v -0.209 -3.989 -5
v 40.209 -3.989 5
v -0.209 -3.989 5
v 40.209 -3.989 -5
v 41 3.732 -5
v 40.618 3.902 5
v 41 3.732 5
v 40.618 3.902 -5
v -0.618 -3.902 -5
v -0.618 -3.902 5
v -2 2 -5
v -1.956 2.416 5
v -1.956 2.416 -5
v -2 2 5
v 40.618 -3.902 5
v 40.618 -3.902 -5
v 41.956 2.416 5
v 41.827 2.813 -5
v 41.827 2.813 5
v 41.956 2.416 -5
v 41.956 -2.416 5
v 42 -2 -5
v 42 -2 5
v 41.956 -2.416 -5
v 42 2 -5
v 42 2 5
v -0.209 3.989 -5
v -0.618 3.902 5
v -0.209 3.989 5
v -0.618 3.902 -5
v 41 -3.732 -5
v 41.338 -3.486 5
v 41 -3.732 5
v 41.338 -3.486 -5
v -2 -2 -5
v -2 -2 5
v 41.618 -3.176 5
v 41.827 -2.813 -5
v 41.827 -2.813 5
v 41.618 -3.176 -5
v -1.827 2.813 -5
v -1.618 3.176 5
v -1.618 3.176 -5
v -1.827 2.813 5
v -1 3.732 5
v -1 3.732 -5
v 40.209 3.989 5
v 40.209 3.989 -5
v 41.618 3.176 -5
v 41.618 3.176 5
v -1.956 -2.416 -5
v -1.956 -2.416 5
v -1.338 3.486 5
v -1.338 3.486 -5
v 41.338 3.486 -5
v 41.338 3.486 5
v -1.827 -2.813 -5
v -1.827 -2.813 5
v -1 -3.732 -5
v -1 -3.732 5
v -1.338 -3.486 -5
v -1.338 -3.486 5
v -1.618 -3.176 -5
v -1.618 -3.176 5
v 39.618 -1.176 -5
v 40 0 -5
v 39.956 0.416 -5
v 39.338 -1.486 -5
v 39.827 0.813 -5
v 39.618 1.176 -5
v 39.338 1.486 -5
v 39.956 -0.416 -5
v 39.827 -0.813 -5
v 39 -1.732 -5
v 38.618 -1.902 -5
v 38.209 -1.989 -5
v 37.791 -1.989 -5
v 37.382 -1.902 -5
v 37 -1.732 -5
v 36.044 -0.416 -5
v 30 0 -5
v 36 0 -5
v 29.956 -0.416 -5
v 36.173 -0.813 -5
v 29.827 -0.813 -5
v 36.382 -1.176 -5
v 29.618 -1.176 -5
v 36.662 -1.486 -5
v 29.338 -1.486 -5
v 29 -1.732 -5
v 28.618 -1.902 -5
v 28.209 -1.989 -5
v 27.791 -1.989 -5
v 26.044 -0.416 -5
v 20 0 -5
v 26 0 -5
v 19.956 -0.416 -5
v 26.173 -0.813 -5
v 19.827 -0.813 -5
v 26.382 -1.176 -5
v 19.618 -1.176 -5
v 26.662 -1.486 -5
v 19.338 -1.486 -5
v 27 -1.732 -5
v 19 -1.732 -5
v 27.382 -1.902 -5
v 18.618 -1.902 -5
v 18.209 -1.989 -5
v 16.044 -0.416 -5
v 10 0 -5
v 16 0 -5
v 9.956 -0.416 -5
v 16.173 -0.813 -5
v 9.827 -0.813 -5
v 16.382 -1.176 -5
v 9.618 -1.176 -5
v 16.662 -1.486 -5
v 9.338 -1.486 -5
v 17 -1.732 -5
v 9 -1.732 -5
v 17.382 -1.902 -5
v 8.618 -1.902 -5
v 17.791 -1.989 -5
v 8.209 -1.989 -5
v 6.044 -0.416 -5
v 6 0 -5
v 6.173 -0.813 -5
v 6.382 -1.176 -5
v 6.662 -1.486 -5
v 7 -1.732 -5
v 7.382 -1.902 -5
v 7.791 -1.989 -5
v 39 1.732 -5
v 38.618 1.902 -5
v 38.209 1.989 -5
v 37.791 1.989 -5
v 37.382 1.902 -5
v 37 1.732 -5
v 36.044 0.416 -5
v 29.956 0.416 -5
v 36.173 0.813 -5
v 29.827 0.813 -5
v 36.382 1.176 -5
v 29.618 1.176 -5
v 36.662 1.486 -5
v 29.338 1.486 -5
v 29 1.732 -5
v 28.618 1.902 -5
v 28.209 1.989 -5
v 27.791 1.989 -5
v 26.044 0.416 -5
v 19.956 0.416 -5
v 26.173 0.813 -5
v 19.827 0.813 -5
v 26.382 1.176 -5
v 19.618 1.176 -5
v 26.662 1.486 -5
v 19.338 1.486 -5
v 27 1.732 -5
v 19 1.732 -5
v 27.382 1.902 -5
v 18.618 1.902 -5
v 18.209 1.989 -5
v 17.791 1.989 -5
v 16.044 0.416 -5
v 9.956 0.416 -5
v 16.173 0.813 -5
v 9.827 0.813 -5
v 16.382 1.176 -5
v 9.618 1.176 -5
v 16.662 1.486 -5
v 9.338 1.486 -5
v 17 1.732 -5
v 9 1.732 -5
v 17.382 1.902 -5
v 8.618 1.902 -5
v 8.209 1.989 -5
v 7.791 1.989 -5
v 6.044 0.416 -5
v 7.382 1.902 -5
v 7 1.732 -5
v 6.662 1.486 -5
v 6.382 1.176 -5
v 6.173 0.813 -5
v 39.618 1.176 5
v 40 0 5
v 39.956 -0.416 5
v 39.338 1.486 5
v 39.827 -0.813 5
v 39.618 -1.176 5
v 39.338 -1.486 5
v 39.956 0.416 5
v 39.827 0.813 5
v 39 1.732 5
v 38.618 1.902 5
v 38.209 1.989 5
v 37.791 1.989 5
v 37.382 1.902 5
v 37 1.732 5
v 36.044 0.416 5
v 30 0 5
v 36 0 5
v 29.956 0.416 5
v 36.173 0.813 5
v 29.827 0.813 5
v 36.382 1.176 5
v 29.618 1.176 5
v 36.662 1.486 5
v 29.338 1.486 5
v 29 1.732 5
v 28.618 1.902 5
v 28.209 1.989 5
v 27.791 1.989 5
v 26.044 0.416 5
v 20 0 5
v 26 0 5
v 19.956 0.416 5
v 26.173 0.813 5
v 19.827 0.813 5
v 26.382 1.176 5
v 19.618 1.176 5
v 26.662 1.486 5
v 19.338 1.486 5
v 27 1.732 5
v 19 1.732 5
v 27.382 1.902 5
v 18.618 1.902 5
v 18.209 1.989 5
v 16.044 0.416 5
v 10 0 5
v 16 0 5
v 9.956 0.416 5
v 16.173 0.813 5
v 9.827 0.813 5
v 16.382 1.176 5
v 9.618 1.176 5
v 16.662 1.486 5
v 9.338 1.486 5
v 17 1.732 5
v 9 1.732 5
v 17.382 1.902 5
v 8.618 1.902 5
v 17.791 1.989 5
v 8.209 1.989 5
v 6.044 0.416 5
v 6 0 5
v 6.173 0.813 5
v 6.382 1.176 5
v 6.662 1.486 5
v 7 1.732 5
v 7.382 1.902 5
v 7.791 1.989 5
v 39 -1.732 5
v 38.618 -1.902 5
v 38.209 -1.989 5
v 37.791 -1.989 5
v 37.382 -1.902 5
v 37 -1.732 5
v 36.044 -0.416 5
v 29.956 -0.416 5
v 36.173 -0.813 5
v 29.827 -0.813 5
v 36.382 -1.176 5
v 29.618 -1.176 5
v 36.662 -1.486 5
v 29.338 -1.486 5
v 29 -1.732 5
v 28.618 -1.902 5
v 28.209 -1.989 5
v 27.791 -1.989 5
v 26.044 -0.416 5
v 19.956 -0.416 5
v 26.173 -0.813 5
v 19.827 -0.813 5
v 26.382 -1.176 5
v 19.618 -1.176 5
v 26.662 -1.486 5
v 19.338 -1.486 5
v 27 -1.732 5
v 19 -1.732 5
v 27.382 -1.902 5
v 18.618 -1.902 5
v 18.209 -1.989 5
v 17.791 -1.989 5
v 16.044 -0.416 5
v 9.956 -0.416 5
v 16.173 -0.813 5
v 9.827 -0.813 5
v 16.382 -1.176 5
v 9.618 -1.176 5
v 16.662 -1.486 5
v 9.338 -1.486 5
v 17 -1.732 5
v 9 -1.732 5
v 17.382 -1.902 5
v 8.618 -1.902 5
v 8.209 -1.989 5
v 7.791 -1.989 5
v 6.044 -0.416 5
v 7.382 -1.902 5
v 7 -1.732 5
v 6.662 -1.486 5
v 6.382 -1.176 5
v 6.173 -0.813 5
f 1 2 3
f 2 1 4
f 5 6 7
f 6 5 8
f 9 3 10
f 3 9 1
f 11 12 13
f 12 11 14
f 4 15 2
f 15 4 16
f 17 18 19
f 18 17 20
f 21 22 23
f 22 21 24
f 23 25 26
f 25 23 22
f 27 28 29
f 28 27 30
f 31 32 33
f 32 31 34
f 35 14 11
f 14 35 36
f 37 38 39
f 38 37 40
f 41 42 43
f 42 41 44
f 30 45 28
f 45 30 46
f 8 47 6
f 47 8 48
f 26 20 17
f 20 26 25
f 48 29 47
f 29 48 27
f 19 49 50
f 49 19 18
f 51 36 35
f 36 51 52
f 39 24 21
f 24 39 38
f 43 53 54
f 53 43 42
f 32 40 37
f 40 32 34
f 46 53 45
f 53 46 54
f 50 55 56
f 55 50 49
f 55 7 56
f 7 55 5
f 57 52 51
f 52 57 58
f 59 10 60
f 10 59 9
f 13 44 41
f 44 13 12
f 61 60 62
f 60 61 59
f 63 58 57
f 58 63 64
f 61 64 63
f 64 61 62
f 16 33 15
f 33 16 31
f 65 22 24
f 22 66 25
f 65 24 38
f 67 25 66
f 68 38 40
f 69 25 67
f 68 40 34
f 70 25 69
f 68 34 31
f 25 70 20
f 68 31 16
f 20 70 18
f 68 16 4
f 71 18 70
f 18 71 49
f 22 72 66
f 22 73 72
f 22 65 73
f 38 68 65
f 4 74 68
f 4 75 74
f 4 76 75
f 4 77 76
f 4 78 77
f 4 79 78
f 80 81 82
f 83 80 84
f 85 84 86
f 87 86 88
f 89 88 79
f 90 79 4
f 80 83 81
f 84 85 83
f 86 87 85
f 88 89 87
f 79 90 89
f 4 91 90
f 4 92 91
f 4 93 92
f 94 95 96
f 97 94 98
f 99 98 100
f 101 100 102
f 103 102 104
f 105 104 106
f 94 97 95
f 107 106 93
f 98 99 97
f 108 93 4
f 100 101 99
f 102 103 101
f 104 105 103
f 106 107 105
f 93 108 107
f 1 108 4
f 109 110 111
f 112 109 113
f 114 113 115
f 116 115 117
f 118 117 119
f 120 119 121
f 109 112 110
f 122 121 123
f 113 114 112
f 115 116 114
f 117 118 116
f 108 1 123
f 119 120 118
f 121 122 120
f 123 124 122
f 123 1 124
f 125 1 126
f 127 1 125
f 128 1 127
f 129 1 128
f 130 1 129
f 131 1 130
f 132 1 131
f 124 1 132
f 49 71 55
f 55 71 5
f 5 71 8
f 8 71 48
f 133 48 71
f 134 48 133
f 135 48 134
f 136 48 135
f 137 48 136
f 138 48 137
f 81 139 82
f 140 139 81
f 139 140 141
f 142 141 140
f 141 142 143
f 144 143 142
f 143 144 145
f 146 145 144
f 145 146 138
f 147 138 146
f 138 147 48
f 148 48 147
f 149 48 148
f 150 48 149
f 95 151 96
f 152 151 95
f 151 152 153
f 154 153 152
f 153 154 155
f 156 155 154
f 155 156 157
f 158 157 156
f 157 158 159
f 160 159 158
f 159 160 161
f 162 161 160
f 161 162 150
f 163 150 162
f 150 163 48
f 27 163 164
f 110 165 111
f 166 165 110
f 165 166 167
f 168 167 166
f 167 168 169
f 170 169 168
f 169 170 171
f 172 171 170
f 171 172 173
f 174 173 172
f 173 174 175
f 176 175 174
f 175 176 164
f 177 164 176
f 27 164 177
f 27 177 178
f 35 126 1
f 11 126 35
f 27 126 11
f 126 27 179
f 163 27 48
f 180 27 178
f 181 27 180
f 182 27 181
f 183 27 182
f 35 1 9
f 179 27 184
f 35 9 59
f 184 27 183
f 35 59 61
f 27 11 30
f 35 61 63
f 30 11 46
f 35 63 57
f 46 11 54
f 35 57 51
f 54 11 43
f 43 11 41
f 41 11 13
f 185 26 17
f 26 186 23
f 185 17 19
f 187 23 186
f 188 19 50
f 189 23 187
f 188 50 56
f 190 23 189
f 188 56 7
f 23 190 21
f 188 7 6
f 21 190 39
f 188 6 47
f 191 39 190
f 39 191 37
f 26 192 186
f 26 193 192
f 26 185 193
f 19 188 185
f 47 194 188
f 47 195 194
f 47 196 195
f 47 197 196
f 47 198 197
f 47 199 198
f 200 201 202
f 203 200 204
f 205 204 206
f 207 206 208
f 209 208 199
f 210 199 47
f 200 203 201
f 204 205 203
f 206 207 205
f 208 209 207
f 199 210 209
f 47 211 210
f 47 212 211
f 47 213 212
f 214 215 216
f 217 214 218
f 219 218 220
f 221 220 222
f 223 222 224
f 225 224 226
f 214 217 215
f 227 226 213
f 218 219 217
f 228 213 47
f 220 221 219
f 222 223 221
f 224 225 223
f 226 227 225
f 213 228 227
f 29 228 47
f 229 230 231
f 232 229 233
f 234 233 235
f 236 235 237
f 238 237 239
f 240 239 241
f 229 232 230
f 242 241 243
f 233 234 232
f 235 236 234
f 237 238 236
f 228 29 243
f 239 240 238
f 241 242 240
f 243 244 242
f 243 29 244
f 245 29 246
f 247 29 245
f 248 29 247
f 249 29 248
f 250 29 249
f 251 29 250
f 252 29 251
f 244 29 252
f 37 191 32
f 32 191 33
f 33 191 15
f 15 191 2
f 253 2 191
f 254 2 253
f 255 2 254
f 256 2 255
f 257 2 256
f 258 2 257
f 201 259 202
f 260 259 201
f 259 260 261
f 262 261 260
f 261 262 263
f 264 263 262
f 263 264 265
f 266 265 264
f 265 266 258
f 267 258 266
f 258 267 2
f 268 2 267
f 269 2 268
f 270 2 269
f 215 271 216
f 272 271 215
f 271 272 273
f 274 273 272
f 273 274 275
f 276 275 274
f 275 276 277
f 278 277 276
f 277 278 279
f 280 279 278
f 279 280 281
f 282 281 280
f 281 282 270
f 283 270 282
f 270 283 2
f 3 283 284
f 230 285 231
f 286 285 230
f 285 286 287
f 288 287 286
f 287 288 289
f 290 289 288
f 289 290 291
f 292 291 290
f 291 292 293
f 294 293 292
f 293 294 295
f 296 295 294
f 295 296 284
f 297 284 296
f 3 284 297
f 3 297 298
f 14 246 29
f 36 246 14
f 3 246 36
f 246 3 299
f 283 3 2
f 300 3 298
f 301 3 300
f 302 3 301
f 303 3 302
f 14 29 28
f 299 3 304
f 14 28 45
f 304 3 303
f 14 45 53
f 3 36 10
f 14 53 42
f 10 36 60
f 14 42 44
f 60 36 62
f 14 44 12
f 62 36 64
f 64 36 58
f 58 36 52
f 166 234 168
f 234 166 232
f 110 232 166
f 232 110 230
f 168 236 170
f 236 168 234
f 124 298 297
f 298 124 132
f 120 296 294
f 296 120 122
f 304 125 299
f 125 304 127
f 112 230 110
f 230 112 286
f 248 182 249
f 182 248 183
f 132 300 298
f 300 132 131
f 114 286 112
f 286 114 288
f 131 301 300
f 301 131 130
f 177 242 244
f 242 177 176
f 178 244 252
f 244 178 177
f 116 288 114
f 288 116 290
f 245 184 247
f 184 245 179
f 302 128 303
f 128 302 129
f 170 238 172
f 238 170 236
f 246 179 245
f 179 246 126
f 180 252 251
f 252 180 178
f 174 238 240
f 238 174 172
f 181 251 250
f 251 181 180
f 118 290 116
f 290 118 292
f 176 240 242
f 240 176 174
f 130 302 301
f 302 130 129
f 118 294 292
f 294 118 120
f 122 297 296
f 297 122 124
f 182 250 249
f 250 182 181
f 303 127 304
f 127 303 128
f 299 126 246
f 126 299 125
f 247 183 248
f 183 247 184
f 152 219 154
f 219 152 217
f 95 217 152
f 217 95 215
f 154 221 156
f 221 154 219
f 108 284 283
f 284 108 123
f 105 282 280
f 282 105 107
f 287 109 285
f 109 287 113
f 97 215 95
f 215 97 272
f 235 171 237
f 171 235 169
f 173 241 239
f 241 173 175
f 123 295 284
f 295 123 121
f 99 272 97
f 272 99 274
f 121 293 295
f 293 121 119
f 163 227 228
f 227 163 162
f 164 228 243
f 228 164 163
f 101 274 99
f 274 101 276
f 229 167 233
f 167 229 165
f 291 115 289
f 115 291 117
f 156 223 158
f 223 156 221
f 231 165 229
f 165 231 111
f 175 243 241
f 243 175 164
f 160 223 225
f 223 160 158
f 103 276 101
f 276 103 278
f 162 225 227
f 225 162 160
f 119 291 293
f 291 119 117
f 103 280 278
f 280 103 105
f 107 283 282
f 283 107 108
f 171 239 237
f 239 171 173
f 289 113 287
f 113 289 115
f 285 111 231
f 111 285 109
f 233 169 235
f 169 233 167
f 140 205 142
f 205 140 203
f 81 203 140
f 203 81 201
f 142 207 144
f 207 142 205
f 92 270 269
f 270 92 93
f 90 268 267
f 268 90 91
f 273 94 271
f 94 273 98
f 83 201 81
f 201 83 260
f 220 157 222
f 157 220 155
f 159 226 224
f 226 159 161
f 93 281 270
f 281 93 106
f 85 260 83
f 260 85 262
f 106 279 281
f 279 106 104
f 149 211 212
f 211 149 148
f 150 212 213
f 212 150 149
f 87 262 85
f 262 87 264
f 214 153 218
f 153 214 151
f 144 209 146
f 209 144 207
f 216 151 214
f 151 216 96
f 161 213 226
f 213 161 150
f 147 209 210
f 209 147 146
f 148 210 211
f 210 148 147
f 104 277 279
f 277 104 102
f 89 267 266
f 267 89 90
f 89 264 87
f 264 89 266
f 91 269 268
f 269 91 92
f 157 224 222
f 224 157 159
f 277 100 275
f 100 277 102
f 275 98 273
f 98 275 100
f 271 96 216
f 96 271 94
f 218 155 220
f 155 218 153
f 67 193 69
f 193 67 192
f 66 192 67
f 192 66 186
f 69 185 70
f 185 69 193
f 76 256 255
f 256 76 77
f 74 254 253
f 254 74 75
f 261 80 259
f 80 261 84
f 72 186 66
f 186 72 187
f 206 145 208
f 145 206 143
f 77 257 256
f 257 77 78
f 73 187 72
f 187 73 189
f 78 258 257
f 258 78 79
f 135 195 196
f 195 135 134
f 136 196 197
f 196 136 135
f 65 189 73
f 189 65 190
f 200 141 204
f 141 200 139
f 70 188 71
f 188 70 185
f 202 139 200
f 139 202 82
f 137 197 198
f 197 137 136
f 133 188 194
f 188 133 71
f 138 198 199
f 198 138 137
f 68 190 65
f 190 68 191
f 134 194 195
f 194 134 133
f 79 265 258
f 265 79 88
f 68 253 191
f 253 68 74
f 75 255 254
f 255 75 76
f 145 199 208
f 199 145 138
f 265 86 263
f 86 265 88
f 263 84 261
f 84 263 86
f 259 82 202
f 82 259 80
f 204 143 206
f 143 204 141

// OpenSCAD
$fn=30;
height=10;
radius=2;
difference(){
    hull(){
        translate([0,-2,0])cylinder(r=radius,h=height, center=true);
        translate([40,2,0])cylinder(r=radius,h=height, center=true);
        translate([0,2,0])cylinder(r=radius,h=height, center=true);
        translate([40,-2,0])cylinder(r=radius,h=height, center=true);
  }
    translate([8,0,0])cylinder(d=radius/0.5,h=height*10, center=true);
    translate([18,0,0])cylinder(d=radius/0.5,h=height*10, center=true);
    translate([28,0,0])cylinder(d=radius/0.5,h=height*10, center=true);
    translate([38,0,0])cylinder(d=radius/0.5,h=height*10, center=true);
}
